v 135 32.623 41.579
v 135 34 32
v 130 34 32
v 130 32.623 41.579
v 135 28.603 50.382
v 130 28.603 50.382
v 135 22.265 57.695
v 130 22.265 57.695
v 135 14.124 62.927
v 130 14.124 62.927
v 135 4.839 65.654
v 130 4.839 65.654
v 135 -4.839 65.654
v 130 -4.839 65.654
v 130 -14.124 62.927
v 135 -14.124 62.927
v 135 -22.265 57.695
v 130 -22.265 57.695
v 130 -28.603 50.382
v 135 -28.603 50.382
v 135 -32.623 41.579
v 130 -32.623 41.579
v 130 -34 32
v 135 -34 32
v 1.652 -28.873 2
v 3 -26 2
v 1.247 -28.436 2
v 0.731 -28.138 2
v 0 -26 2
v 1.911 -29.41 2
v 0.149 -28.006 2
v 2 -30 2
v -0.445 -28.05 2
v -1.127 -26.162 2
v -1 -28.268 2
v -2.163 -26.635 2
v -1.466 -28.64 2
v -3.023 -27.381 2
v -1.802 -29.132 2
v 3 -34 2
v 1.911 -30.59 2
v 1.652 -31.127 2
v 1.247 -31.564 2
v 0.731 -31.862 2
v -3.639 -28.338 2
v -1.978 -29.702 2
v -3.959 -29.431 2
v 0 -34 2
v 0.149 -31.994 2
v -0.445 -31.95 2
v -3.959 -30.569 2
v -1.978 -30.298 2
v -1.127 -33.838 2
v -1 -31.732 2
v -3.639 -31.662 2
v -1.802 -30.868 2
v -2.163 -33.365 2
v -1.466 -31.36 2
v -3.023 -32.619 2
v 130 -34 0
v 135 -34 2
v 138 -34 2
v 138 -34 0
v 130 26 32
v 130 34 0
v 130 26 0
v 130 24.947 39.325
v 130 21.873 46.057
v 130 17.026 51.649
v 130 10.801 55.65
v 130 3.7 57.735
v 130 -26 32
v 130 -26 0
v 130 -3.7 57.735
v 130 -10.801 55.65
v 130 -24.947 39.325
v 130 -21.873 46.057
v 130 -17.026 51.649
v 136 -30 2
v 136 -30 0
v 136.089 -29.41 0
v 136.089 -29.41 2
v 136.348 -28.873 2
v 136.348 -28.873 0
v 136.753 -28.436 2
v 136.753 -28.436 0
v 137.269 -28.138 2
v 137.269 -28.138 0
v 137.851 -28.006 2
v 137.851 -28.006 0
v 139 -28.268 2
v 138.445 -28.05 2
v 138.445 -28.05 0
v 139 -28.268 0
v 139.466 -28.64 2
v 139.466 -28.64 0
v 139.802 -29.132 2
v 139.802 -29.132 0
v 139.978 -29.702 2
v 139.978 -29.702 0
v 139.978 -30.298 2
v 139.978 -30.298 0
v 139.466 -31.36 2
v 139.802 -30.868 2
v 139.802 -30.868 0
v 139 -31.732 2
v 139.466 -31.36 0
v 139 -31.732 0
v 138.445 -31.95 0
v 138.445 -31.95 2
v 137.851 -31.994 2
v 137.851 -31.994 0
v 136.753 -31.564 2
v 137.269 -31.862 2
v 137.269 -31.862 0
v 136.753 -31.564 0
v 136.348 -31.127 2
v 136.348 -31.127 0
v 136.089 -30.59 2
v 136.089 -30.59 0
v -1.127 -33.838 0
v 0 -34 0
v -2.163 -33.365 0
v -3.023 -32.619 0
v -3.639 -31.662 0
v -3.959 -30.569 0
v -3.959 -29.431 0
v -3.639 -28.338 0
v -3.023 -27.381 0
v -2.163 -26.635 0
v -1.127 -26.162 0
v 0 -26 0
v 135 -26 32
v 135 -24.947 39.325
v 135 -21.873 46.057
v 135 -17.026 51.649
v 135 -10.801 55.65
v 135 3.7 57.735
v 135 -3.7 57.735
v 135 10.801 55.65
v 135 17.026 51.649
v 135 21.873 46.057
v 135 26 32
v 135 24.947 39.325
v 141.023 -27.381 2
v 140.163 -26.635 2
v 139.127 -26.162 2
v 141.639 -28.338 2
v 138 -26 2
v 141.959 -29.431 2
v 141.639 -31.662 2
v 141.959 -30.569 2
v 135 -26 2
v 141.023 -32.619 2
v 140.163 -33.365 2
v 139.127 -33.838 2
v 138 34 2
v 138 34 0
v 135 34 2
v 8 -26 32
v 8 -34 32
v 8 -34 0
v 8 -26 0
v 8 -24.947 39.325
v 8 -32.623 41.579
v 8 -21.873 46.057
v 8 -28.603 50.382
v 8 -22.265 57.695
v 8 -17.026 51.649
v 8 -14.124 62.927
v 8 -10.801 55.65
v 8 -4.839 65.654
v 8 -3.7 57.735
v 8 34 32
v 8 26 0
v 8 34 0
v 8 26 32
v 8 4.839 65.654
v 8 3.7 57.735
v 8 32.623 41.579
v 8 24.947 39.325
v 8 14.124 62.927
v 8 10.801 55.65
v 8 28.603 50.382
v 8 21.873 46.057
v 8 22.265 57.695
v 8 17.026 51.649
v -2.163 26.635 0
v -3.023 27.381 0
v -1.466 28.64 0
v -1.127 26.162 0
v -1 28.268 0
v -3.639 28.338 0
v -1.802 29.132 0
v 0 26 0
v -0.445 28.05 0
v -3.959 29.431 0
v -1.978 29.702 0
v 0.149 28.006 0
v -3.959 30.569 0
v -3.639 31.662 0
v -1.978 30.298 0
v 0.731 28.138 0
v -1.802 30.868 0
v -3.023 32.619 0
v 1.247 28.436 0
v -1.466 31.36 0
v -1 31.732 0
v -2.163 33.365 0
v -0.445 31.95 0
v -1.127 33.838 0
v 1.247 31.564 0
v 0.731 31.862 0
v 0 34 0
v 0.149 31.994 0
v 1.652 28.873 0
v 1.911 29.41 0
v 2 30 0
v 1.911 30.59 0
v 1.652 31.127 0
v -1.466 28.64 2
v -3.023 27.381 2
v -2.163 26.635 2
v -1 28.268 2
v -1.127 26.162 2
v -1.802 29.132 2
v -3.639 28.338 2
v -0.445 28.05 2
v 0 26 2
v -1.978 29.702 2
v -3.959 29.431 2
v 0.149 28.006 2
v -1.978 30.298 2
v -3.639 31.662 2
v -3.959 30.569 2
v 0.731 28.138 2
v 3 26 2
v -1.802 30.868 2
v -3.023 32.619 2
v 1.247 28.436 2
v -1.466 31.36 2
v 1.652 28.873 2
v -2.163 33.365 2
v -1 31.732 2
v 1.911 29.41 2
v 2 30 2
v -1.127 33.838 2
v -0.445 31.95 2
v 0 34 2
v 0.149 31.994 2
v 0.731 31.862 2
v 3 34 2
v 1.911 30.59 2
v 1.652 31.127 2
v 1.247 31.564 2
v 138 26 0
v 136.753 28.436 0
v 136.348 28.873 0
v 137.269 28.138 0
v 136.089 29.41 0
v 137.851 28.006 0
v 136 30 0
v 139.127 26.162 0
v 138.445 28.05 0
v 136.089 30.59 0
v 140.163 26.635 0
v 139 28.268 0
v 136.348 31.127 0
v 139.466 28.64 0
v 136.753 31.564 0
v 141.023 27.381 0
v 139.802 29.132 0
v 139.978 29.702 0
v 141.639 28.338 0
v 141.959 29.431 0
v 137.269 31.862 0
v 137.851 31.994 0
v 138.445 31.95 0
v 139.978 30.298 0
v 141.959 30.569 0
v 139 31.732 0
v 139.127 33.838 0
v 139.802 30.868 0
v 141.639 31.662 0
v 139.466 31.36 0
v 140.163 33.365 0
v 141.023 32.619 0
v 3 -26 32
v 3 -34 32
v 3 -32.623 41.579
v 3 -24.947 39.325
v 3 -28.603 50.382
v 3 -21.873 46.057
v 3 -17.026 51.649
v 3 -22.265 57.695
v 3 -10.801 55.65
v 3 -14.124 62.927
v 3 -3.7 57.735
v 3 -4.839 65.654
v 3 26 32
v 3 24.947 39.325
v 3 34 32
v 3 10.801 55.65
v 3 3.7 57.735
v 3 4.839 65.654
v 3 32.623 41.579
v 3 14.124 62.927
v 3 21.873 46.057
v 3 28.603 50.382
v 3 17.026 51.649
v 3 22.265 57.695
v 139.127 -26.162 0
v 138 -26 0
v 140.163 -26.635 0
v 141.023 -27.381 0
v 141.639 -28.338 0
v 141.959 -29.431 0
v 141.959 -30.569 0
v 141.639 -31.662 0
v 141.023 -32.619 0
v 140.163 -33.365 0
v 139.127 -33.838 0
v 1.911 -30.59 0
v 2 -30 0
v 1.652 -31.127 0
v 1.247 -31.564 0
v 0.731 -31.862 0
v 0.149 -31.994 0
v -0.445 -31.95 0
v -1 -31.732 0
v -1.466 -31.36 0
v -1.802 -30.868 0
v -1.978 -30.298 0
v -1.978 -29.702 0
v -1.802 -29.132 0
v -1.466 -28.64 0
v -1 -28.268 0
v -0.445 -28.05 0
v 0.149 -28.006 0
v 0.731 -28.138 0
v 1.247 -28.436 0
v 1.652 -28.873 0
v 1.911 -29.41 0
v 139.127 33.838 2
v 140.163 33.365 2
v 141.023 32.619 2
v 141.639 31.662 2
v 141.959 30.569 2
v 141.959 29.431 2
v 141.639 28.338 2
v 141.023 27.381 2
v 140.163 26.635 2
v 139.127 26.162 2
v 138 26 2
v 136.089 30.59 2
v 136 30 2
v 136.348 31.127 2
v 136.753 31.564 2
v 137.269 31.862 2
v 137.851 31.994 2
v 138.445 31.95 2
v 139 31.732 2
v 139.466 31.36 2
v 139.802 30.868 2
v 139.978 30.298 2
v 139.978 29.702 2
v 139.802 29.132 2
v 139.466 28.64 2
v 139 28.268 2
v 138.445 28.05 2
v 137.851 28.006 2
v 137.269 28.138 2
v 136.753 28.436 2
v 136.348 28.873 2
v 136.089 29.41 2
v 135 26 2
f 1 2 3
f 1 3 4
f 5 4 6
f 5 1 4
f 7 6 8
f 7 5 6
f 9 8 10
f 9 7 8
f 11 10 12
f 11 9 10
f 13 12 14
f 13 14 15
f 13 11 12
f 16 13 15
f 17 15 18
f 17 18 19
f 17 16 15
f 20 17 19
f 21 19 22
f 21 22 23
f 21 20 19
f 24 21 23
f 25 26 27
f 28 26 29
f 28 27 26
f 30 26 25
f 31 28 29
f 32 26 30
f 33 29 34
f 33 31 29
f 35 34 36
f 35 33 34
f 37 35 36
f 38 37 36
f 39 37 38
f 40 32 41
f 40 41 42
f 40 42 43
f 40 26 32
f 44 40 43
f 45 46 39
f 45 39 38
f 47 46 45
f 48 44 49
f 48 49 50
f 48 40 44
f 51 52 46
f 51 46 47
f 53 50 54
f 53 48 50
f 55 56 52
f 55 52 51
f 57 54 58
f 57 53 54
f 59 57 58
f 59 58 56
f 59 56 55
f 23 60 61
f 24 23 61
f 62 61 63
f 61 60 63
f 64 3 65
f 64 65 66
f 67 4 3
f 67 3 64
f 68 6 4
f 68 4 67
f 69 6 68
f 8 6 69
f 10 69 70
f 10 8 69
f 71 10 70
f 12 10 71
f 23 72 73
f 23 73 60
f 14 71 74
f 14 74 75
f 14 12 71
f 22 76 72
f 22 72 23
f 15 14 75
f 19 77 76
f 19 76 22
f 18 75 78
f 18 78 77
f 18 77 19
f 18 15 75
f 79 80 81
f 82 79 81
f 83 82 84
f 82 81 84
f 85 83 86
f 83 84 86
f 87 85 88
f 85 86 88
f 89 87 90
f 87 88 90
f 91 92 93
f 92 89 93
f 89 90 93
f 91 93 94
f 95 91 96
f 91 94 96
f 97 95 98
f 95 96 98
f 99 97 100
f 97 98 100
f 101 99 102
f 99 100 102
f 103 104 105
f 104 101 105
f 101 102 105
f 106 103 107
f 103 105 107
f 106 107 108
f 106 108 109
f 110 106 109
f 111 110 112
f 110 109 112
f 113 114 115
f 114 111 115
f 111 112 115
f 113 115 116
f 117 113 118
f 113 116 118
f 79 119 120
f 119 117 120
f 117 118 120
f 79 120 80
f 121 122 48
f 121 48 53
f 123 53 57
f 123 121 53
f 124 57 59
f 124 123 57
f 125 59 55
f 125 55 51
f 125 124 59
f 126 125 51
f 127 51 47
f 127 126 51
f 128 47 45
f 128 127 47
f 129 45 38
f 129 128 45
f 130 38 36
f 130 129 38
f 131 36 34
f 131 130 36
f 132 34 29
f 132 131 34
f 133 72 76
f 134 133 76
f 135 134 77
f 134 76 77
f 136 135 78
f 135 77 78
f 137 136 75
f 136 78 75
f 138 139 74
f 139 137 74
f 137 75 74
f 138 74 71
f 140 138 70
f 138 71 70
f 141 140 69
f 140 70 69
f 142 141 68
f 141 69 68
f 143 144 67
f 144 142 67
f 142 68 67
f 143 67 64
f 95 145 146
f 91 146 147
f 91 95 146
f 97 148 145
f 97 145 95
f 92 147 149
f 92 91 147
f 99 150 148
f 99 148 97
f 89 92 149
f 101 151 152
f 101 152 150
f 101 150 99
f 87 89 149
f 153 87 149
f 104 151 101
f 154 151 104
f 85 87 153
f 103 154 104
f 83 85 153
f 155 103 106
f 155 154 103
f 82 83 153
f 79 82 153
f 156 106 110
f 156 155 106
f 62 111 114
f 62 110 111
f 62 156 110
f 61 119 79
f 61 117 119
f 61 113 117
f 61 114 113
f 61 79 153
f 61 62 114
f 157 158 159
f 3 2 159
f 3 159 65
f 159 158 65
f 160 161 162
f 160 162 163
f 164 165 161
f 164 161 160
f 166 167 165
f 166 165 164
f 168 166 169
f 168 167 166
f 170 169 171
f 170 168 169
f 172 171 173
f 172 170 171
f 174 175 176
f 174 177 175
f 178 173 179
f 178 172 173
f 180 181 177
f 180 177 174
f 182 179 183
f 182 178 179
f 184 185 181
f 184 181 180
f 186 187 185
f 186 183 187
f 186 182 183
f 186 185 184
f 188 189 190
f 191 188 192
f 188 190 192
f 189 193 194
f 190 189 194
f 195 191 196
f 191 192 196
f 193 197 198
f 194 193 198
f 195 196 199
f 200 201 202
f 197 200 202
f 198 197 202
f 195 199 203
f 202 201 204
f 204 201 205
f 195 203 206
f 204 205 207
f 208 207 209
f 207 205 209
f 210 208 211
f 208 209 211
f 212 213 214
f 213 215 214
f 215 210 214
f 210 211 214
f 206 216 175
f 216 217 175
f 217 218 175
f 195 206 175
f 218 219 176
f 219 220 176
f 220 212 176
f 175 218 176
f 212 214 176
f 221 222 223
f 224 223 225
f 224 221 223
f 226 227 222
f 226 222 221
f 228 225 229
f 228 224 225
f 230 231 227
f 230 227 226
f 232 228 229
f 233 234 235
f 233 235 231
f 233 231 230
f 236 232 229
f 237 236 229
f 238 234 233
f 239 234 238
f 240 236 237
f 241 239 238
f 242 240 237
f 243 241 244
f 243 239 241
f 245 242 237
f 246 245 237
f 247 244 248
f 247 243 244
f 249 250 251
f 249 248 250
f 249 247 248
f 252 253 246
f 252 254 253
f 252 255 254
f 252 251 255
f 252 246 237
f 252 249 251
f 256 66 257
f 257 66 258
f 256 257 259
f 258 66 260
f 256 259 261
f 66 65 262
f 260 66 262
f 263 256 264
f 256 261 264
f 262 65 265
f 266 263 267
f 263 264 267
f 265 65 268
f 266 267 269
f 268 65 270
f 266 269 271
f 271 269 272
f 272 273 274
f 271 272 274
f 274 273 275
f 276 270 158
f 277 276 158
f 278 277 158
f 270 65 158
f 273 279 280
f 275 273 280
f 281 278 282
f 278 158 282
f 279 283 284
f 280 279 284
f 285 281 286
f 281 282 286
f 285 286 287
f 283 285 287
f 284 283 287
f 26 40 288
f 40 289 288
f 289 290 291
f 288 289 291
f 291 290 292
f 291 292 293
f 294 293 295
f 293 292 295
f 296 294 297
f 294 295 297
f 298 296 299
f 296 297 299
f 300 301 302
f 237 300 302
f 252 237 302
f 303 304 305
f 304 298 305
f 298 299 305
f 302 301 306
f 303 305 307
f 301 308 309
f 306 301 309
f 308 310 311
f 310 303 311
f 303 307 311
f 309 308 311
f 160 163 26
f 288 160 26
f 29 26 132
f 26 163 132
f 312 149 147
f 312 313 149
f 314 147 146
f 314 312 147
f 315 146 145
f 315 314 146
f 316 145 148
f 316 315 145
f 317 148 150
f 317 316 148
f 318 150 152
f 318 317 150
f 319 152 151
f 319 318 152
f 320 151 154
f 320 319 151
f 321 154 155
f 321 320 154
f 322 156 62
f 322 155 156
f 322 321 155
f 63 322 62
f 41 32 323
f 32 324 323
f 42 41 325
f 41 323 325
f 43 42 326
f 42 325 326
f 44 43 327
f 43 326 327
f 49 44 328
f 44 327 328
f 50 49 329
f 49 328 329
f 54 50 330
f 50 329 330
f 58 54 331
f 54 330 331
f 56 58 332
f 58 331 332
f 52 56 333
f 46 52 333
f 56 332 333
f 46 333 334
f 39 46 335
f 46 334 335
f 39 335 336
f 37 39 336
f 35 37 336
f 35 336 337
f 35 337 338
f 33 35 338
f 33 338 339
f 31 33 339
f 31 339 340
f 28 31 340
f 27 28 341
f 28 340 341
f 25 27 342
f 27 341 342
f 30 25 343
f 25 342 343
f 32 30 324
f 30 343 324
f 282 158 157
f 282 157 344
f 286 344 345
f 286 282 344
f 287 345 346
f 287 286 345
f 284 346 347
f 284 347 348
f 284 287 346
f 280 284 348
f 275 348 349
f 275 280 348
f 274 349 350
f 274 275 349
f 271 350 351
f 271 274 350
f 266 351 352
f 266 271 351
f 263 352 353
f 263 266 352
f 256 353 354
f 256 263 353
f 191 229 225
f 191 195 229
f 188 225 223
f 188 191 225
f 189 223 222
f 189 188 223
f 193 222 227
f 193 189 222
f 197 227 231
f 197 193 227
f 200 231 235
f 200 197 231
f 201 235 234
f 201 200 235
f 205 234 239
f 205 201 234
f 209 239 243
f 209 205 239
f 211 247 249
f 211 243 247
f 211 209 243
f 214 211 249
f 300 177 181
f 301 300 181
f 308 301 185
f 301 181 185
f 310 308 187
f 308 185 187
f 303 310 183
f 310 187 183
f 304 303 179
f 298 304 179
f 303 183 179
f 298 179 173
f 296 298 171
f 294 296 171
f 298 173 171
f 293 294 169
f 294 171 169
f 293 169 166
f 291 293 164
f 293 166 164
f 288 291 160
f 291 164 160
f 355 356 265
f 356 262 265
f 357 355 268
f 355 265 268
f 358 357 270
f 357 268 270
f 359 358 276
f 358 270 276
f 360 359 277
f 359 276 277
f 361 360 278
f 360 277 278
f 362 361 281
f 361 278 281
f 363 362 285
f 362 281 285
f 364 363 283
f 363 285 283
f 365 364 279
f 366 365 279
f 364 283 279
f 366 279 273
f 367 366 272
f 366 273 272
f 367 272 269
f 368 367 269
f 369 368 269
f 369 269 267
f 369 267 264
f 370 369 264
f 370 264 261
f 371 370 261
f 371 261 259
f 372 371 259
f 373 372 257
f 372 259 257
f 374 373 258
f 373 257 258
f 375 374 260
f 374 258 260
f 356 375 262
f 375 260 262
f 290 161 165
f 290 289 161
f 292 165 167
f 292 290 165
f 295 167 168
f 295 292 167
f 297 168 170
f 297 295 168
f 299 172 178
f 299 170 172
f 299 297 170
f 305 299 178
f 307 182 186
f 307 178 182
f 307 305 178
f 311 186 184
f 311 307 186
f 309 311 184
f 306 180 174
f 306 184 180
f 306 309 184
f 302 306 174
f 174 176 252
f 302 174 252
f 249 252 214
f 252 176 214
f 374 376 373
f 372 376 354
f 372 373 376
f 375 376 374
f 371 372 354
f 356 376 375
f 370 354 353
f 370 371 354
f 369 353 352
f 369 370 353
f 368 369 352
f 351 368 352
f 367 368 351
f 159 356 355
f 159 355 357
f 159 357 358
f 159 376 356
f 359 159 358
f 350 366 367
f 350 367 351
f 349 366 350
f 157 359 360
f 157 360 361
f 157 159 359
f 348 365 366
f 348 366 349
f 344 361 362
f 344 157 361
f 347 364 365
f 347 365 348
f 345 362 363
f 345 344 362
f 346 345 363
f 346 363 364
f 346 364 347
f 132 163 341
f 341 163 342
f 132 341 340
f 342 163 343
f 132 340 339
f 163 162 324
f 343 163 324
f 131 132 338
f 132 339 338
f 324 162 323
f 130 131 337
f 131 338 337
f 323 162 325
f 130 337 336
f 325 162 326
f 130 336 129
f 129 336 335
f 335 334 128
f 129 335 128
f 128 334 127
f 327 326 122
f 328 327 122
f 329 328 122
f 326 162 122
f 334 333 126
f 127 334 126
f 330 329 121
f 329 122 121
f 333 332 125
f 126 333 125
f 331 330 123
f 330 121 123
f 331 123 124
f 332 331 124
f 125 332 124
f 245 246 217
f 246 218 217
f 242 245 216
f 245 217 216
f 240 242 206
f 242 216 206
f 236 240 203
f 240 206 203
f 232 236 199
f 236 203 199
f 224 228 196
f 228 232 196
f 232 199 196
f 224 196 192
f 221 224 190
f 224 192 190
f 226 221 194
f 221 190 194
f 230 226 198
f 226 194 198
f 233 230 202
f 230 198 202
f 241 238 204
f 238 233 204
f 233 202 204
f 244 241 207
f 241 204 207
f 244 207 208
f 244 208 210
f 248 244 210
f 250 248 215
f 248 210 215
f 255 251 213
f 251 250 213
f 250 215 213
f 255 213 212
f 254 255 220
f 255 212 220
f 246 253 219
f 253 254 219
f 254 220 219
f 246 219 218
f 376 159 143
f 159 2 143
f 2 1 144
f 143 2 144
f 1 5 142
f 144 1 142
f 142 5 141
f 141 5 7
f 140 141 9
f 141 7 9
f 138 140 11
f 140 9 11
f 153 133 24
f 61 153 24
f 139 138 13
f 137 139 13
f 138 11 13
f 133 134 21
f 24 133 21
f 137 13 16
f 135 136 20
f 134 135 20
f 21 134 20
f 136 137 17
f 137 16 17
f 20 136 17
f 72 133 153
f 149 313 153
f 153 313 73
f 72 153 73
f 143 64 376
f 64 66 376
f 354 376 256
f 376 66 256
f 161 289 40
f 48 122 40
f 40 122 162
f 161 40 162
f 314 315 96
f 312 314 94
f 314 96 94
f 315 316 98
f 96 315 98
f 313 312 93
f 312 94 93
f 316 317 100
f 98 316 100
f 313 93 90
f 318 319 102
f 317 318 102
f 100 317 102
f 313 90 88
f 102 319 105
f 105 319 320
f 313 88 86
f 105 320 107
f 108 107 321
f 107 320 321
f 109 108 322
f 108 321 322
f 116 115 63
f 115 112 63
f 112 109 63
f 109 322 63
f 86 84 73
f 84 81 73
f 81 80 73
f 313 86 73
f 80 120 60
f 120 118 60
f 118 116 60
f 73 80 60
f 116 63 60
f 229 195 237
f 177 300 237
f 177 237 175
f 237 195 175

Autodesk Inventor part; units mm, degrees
ref_plane "XZ Plane" through (0, 0, 0) normal (0, 1, 0) x (-1, 0, 0)
ref_plane "XY Plane" through (0, 0, 0) normal (0, 0, 1) x (1, 0, 0)
sketch "Sketch1" plane through (0, 0, 0) normal (0, 0, 1) x (1, 0, 0)
  circle A0 centre (0, 30) radius 2
  circle A1 centre (0, 30) radius 4
  line L0 (0, 26) -> (8, 26)
  line L1 (8, 26) -> (8, 34)
  line L2 (8, 34) -> (0, 34)
  point P0 (0, 0)
  dimension "d0" = 2
  dimension "d2" = 4
  dimension "d6" = 30
  dimension "d7" = 8
extrude "Extrusion1" add sketch "Sketch1" along normal blind 2
sketch "Sketch2" plane through (0, 0, 2) normal (0, 0, 1) x (1, 0, 0)
  line L0 (0, 26) -> (8, 26) projected
  line L1 (8, 26) -> (8, 34) projected
  line L2 (8, 34) -> (0, 34) projected
  line L3 (3, 26) -> (3, 34)
  line L4 (-6.4, 0) -> (10.4, 0) projected
  point P0 (0, 0)
  dimension "d10" = 5
extrude "Extrusion2" add sketch "Sketch2" along normal blind 30
mirror "Mirror1" about plane through (0, 0, 0) normal (0, 1, 0) of "Extrusion1", "Extrusion2"
sketch "RevolutionSketch" plane through (0, 0, 32) normal (0, 0, 1) x (1, 0, 0)
  line L0 (3, 26) -> (8, 26) projected
  line L1 (8, 26) -> (8, 34) projected
  line L2 (8, 34) -> (3, 34) projected
  line L3 (3, 34) -> (3, 26) projected
  line L4 (-6.4, 0) -> (10.4, 0) projected
  point P0 (0, 0)
revolve "Revolution2" add sketch "RevolutionSketch" angle 180 about axis through (-10, 0, 32) along (1, 0, 0)
ref_plane "Work Plane1" through (69, 0, 0) normal (1, 0, 0) x (0, 1, 0)
mirror "Mirror2" about plane through (69, 0, 0) normal (1, 0, 0) of "Extrusion1", "Mirror1", "Extrusion2", "Revolution2"
properties part number "handle_it"
